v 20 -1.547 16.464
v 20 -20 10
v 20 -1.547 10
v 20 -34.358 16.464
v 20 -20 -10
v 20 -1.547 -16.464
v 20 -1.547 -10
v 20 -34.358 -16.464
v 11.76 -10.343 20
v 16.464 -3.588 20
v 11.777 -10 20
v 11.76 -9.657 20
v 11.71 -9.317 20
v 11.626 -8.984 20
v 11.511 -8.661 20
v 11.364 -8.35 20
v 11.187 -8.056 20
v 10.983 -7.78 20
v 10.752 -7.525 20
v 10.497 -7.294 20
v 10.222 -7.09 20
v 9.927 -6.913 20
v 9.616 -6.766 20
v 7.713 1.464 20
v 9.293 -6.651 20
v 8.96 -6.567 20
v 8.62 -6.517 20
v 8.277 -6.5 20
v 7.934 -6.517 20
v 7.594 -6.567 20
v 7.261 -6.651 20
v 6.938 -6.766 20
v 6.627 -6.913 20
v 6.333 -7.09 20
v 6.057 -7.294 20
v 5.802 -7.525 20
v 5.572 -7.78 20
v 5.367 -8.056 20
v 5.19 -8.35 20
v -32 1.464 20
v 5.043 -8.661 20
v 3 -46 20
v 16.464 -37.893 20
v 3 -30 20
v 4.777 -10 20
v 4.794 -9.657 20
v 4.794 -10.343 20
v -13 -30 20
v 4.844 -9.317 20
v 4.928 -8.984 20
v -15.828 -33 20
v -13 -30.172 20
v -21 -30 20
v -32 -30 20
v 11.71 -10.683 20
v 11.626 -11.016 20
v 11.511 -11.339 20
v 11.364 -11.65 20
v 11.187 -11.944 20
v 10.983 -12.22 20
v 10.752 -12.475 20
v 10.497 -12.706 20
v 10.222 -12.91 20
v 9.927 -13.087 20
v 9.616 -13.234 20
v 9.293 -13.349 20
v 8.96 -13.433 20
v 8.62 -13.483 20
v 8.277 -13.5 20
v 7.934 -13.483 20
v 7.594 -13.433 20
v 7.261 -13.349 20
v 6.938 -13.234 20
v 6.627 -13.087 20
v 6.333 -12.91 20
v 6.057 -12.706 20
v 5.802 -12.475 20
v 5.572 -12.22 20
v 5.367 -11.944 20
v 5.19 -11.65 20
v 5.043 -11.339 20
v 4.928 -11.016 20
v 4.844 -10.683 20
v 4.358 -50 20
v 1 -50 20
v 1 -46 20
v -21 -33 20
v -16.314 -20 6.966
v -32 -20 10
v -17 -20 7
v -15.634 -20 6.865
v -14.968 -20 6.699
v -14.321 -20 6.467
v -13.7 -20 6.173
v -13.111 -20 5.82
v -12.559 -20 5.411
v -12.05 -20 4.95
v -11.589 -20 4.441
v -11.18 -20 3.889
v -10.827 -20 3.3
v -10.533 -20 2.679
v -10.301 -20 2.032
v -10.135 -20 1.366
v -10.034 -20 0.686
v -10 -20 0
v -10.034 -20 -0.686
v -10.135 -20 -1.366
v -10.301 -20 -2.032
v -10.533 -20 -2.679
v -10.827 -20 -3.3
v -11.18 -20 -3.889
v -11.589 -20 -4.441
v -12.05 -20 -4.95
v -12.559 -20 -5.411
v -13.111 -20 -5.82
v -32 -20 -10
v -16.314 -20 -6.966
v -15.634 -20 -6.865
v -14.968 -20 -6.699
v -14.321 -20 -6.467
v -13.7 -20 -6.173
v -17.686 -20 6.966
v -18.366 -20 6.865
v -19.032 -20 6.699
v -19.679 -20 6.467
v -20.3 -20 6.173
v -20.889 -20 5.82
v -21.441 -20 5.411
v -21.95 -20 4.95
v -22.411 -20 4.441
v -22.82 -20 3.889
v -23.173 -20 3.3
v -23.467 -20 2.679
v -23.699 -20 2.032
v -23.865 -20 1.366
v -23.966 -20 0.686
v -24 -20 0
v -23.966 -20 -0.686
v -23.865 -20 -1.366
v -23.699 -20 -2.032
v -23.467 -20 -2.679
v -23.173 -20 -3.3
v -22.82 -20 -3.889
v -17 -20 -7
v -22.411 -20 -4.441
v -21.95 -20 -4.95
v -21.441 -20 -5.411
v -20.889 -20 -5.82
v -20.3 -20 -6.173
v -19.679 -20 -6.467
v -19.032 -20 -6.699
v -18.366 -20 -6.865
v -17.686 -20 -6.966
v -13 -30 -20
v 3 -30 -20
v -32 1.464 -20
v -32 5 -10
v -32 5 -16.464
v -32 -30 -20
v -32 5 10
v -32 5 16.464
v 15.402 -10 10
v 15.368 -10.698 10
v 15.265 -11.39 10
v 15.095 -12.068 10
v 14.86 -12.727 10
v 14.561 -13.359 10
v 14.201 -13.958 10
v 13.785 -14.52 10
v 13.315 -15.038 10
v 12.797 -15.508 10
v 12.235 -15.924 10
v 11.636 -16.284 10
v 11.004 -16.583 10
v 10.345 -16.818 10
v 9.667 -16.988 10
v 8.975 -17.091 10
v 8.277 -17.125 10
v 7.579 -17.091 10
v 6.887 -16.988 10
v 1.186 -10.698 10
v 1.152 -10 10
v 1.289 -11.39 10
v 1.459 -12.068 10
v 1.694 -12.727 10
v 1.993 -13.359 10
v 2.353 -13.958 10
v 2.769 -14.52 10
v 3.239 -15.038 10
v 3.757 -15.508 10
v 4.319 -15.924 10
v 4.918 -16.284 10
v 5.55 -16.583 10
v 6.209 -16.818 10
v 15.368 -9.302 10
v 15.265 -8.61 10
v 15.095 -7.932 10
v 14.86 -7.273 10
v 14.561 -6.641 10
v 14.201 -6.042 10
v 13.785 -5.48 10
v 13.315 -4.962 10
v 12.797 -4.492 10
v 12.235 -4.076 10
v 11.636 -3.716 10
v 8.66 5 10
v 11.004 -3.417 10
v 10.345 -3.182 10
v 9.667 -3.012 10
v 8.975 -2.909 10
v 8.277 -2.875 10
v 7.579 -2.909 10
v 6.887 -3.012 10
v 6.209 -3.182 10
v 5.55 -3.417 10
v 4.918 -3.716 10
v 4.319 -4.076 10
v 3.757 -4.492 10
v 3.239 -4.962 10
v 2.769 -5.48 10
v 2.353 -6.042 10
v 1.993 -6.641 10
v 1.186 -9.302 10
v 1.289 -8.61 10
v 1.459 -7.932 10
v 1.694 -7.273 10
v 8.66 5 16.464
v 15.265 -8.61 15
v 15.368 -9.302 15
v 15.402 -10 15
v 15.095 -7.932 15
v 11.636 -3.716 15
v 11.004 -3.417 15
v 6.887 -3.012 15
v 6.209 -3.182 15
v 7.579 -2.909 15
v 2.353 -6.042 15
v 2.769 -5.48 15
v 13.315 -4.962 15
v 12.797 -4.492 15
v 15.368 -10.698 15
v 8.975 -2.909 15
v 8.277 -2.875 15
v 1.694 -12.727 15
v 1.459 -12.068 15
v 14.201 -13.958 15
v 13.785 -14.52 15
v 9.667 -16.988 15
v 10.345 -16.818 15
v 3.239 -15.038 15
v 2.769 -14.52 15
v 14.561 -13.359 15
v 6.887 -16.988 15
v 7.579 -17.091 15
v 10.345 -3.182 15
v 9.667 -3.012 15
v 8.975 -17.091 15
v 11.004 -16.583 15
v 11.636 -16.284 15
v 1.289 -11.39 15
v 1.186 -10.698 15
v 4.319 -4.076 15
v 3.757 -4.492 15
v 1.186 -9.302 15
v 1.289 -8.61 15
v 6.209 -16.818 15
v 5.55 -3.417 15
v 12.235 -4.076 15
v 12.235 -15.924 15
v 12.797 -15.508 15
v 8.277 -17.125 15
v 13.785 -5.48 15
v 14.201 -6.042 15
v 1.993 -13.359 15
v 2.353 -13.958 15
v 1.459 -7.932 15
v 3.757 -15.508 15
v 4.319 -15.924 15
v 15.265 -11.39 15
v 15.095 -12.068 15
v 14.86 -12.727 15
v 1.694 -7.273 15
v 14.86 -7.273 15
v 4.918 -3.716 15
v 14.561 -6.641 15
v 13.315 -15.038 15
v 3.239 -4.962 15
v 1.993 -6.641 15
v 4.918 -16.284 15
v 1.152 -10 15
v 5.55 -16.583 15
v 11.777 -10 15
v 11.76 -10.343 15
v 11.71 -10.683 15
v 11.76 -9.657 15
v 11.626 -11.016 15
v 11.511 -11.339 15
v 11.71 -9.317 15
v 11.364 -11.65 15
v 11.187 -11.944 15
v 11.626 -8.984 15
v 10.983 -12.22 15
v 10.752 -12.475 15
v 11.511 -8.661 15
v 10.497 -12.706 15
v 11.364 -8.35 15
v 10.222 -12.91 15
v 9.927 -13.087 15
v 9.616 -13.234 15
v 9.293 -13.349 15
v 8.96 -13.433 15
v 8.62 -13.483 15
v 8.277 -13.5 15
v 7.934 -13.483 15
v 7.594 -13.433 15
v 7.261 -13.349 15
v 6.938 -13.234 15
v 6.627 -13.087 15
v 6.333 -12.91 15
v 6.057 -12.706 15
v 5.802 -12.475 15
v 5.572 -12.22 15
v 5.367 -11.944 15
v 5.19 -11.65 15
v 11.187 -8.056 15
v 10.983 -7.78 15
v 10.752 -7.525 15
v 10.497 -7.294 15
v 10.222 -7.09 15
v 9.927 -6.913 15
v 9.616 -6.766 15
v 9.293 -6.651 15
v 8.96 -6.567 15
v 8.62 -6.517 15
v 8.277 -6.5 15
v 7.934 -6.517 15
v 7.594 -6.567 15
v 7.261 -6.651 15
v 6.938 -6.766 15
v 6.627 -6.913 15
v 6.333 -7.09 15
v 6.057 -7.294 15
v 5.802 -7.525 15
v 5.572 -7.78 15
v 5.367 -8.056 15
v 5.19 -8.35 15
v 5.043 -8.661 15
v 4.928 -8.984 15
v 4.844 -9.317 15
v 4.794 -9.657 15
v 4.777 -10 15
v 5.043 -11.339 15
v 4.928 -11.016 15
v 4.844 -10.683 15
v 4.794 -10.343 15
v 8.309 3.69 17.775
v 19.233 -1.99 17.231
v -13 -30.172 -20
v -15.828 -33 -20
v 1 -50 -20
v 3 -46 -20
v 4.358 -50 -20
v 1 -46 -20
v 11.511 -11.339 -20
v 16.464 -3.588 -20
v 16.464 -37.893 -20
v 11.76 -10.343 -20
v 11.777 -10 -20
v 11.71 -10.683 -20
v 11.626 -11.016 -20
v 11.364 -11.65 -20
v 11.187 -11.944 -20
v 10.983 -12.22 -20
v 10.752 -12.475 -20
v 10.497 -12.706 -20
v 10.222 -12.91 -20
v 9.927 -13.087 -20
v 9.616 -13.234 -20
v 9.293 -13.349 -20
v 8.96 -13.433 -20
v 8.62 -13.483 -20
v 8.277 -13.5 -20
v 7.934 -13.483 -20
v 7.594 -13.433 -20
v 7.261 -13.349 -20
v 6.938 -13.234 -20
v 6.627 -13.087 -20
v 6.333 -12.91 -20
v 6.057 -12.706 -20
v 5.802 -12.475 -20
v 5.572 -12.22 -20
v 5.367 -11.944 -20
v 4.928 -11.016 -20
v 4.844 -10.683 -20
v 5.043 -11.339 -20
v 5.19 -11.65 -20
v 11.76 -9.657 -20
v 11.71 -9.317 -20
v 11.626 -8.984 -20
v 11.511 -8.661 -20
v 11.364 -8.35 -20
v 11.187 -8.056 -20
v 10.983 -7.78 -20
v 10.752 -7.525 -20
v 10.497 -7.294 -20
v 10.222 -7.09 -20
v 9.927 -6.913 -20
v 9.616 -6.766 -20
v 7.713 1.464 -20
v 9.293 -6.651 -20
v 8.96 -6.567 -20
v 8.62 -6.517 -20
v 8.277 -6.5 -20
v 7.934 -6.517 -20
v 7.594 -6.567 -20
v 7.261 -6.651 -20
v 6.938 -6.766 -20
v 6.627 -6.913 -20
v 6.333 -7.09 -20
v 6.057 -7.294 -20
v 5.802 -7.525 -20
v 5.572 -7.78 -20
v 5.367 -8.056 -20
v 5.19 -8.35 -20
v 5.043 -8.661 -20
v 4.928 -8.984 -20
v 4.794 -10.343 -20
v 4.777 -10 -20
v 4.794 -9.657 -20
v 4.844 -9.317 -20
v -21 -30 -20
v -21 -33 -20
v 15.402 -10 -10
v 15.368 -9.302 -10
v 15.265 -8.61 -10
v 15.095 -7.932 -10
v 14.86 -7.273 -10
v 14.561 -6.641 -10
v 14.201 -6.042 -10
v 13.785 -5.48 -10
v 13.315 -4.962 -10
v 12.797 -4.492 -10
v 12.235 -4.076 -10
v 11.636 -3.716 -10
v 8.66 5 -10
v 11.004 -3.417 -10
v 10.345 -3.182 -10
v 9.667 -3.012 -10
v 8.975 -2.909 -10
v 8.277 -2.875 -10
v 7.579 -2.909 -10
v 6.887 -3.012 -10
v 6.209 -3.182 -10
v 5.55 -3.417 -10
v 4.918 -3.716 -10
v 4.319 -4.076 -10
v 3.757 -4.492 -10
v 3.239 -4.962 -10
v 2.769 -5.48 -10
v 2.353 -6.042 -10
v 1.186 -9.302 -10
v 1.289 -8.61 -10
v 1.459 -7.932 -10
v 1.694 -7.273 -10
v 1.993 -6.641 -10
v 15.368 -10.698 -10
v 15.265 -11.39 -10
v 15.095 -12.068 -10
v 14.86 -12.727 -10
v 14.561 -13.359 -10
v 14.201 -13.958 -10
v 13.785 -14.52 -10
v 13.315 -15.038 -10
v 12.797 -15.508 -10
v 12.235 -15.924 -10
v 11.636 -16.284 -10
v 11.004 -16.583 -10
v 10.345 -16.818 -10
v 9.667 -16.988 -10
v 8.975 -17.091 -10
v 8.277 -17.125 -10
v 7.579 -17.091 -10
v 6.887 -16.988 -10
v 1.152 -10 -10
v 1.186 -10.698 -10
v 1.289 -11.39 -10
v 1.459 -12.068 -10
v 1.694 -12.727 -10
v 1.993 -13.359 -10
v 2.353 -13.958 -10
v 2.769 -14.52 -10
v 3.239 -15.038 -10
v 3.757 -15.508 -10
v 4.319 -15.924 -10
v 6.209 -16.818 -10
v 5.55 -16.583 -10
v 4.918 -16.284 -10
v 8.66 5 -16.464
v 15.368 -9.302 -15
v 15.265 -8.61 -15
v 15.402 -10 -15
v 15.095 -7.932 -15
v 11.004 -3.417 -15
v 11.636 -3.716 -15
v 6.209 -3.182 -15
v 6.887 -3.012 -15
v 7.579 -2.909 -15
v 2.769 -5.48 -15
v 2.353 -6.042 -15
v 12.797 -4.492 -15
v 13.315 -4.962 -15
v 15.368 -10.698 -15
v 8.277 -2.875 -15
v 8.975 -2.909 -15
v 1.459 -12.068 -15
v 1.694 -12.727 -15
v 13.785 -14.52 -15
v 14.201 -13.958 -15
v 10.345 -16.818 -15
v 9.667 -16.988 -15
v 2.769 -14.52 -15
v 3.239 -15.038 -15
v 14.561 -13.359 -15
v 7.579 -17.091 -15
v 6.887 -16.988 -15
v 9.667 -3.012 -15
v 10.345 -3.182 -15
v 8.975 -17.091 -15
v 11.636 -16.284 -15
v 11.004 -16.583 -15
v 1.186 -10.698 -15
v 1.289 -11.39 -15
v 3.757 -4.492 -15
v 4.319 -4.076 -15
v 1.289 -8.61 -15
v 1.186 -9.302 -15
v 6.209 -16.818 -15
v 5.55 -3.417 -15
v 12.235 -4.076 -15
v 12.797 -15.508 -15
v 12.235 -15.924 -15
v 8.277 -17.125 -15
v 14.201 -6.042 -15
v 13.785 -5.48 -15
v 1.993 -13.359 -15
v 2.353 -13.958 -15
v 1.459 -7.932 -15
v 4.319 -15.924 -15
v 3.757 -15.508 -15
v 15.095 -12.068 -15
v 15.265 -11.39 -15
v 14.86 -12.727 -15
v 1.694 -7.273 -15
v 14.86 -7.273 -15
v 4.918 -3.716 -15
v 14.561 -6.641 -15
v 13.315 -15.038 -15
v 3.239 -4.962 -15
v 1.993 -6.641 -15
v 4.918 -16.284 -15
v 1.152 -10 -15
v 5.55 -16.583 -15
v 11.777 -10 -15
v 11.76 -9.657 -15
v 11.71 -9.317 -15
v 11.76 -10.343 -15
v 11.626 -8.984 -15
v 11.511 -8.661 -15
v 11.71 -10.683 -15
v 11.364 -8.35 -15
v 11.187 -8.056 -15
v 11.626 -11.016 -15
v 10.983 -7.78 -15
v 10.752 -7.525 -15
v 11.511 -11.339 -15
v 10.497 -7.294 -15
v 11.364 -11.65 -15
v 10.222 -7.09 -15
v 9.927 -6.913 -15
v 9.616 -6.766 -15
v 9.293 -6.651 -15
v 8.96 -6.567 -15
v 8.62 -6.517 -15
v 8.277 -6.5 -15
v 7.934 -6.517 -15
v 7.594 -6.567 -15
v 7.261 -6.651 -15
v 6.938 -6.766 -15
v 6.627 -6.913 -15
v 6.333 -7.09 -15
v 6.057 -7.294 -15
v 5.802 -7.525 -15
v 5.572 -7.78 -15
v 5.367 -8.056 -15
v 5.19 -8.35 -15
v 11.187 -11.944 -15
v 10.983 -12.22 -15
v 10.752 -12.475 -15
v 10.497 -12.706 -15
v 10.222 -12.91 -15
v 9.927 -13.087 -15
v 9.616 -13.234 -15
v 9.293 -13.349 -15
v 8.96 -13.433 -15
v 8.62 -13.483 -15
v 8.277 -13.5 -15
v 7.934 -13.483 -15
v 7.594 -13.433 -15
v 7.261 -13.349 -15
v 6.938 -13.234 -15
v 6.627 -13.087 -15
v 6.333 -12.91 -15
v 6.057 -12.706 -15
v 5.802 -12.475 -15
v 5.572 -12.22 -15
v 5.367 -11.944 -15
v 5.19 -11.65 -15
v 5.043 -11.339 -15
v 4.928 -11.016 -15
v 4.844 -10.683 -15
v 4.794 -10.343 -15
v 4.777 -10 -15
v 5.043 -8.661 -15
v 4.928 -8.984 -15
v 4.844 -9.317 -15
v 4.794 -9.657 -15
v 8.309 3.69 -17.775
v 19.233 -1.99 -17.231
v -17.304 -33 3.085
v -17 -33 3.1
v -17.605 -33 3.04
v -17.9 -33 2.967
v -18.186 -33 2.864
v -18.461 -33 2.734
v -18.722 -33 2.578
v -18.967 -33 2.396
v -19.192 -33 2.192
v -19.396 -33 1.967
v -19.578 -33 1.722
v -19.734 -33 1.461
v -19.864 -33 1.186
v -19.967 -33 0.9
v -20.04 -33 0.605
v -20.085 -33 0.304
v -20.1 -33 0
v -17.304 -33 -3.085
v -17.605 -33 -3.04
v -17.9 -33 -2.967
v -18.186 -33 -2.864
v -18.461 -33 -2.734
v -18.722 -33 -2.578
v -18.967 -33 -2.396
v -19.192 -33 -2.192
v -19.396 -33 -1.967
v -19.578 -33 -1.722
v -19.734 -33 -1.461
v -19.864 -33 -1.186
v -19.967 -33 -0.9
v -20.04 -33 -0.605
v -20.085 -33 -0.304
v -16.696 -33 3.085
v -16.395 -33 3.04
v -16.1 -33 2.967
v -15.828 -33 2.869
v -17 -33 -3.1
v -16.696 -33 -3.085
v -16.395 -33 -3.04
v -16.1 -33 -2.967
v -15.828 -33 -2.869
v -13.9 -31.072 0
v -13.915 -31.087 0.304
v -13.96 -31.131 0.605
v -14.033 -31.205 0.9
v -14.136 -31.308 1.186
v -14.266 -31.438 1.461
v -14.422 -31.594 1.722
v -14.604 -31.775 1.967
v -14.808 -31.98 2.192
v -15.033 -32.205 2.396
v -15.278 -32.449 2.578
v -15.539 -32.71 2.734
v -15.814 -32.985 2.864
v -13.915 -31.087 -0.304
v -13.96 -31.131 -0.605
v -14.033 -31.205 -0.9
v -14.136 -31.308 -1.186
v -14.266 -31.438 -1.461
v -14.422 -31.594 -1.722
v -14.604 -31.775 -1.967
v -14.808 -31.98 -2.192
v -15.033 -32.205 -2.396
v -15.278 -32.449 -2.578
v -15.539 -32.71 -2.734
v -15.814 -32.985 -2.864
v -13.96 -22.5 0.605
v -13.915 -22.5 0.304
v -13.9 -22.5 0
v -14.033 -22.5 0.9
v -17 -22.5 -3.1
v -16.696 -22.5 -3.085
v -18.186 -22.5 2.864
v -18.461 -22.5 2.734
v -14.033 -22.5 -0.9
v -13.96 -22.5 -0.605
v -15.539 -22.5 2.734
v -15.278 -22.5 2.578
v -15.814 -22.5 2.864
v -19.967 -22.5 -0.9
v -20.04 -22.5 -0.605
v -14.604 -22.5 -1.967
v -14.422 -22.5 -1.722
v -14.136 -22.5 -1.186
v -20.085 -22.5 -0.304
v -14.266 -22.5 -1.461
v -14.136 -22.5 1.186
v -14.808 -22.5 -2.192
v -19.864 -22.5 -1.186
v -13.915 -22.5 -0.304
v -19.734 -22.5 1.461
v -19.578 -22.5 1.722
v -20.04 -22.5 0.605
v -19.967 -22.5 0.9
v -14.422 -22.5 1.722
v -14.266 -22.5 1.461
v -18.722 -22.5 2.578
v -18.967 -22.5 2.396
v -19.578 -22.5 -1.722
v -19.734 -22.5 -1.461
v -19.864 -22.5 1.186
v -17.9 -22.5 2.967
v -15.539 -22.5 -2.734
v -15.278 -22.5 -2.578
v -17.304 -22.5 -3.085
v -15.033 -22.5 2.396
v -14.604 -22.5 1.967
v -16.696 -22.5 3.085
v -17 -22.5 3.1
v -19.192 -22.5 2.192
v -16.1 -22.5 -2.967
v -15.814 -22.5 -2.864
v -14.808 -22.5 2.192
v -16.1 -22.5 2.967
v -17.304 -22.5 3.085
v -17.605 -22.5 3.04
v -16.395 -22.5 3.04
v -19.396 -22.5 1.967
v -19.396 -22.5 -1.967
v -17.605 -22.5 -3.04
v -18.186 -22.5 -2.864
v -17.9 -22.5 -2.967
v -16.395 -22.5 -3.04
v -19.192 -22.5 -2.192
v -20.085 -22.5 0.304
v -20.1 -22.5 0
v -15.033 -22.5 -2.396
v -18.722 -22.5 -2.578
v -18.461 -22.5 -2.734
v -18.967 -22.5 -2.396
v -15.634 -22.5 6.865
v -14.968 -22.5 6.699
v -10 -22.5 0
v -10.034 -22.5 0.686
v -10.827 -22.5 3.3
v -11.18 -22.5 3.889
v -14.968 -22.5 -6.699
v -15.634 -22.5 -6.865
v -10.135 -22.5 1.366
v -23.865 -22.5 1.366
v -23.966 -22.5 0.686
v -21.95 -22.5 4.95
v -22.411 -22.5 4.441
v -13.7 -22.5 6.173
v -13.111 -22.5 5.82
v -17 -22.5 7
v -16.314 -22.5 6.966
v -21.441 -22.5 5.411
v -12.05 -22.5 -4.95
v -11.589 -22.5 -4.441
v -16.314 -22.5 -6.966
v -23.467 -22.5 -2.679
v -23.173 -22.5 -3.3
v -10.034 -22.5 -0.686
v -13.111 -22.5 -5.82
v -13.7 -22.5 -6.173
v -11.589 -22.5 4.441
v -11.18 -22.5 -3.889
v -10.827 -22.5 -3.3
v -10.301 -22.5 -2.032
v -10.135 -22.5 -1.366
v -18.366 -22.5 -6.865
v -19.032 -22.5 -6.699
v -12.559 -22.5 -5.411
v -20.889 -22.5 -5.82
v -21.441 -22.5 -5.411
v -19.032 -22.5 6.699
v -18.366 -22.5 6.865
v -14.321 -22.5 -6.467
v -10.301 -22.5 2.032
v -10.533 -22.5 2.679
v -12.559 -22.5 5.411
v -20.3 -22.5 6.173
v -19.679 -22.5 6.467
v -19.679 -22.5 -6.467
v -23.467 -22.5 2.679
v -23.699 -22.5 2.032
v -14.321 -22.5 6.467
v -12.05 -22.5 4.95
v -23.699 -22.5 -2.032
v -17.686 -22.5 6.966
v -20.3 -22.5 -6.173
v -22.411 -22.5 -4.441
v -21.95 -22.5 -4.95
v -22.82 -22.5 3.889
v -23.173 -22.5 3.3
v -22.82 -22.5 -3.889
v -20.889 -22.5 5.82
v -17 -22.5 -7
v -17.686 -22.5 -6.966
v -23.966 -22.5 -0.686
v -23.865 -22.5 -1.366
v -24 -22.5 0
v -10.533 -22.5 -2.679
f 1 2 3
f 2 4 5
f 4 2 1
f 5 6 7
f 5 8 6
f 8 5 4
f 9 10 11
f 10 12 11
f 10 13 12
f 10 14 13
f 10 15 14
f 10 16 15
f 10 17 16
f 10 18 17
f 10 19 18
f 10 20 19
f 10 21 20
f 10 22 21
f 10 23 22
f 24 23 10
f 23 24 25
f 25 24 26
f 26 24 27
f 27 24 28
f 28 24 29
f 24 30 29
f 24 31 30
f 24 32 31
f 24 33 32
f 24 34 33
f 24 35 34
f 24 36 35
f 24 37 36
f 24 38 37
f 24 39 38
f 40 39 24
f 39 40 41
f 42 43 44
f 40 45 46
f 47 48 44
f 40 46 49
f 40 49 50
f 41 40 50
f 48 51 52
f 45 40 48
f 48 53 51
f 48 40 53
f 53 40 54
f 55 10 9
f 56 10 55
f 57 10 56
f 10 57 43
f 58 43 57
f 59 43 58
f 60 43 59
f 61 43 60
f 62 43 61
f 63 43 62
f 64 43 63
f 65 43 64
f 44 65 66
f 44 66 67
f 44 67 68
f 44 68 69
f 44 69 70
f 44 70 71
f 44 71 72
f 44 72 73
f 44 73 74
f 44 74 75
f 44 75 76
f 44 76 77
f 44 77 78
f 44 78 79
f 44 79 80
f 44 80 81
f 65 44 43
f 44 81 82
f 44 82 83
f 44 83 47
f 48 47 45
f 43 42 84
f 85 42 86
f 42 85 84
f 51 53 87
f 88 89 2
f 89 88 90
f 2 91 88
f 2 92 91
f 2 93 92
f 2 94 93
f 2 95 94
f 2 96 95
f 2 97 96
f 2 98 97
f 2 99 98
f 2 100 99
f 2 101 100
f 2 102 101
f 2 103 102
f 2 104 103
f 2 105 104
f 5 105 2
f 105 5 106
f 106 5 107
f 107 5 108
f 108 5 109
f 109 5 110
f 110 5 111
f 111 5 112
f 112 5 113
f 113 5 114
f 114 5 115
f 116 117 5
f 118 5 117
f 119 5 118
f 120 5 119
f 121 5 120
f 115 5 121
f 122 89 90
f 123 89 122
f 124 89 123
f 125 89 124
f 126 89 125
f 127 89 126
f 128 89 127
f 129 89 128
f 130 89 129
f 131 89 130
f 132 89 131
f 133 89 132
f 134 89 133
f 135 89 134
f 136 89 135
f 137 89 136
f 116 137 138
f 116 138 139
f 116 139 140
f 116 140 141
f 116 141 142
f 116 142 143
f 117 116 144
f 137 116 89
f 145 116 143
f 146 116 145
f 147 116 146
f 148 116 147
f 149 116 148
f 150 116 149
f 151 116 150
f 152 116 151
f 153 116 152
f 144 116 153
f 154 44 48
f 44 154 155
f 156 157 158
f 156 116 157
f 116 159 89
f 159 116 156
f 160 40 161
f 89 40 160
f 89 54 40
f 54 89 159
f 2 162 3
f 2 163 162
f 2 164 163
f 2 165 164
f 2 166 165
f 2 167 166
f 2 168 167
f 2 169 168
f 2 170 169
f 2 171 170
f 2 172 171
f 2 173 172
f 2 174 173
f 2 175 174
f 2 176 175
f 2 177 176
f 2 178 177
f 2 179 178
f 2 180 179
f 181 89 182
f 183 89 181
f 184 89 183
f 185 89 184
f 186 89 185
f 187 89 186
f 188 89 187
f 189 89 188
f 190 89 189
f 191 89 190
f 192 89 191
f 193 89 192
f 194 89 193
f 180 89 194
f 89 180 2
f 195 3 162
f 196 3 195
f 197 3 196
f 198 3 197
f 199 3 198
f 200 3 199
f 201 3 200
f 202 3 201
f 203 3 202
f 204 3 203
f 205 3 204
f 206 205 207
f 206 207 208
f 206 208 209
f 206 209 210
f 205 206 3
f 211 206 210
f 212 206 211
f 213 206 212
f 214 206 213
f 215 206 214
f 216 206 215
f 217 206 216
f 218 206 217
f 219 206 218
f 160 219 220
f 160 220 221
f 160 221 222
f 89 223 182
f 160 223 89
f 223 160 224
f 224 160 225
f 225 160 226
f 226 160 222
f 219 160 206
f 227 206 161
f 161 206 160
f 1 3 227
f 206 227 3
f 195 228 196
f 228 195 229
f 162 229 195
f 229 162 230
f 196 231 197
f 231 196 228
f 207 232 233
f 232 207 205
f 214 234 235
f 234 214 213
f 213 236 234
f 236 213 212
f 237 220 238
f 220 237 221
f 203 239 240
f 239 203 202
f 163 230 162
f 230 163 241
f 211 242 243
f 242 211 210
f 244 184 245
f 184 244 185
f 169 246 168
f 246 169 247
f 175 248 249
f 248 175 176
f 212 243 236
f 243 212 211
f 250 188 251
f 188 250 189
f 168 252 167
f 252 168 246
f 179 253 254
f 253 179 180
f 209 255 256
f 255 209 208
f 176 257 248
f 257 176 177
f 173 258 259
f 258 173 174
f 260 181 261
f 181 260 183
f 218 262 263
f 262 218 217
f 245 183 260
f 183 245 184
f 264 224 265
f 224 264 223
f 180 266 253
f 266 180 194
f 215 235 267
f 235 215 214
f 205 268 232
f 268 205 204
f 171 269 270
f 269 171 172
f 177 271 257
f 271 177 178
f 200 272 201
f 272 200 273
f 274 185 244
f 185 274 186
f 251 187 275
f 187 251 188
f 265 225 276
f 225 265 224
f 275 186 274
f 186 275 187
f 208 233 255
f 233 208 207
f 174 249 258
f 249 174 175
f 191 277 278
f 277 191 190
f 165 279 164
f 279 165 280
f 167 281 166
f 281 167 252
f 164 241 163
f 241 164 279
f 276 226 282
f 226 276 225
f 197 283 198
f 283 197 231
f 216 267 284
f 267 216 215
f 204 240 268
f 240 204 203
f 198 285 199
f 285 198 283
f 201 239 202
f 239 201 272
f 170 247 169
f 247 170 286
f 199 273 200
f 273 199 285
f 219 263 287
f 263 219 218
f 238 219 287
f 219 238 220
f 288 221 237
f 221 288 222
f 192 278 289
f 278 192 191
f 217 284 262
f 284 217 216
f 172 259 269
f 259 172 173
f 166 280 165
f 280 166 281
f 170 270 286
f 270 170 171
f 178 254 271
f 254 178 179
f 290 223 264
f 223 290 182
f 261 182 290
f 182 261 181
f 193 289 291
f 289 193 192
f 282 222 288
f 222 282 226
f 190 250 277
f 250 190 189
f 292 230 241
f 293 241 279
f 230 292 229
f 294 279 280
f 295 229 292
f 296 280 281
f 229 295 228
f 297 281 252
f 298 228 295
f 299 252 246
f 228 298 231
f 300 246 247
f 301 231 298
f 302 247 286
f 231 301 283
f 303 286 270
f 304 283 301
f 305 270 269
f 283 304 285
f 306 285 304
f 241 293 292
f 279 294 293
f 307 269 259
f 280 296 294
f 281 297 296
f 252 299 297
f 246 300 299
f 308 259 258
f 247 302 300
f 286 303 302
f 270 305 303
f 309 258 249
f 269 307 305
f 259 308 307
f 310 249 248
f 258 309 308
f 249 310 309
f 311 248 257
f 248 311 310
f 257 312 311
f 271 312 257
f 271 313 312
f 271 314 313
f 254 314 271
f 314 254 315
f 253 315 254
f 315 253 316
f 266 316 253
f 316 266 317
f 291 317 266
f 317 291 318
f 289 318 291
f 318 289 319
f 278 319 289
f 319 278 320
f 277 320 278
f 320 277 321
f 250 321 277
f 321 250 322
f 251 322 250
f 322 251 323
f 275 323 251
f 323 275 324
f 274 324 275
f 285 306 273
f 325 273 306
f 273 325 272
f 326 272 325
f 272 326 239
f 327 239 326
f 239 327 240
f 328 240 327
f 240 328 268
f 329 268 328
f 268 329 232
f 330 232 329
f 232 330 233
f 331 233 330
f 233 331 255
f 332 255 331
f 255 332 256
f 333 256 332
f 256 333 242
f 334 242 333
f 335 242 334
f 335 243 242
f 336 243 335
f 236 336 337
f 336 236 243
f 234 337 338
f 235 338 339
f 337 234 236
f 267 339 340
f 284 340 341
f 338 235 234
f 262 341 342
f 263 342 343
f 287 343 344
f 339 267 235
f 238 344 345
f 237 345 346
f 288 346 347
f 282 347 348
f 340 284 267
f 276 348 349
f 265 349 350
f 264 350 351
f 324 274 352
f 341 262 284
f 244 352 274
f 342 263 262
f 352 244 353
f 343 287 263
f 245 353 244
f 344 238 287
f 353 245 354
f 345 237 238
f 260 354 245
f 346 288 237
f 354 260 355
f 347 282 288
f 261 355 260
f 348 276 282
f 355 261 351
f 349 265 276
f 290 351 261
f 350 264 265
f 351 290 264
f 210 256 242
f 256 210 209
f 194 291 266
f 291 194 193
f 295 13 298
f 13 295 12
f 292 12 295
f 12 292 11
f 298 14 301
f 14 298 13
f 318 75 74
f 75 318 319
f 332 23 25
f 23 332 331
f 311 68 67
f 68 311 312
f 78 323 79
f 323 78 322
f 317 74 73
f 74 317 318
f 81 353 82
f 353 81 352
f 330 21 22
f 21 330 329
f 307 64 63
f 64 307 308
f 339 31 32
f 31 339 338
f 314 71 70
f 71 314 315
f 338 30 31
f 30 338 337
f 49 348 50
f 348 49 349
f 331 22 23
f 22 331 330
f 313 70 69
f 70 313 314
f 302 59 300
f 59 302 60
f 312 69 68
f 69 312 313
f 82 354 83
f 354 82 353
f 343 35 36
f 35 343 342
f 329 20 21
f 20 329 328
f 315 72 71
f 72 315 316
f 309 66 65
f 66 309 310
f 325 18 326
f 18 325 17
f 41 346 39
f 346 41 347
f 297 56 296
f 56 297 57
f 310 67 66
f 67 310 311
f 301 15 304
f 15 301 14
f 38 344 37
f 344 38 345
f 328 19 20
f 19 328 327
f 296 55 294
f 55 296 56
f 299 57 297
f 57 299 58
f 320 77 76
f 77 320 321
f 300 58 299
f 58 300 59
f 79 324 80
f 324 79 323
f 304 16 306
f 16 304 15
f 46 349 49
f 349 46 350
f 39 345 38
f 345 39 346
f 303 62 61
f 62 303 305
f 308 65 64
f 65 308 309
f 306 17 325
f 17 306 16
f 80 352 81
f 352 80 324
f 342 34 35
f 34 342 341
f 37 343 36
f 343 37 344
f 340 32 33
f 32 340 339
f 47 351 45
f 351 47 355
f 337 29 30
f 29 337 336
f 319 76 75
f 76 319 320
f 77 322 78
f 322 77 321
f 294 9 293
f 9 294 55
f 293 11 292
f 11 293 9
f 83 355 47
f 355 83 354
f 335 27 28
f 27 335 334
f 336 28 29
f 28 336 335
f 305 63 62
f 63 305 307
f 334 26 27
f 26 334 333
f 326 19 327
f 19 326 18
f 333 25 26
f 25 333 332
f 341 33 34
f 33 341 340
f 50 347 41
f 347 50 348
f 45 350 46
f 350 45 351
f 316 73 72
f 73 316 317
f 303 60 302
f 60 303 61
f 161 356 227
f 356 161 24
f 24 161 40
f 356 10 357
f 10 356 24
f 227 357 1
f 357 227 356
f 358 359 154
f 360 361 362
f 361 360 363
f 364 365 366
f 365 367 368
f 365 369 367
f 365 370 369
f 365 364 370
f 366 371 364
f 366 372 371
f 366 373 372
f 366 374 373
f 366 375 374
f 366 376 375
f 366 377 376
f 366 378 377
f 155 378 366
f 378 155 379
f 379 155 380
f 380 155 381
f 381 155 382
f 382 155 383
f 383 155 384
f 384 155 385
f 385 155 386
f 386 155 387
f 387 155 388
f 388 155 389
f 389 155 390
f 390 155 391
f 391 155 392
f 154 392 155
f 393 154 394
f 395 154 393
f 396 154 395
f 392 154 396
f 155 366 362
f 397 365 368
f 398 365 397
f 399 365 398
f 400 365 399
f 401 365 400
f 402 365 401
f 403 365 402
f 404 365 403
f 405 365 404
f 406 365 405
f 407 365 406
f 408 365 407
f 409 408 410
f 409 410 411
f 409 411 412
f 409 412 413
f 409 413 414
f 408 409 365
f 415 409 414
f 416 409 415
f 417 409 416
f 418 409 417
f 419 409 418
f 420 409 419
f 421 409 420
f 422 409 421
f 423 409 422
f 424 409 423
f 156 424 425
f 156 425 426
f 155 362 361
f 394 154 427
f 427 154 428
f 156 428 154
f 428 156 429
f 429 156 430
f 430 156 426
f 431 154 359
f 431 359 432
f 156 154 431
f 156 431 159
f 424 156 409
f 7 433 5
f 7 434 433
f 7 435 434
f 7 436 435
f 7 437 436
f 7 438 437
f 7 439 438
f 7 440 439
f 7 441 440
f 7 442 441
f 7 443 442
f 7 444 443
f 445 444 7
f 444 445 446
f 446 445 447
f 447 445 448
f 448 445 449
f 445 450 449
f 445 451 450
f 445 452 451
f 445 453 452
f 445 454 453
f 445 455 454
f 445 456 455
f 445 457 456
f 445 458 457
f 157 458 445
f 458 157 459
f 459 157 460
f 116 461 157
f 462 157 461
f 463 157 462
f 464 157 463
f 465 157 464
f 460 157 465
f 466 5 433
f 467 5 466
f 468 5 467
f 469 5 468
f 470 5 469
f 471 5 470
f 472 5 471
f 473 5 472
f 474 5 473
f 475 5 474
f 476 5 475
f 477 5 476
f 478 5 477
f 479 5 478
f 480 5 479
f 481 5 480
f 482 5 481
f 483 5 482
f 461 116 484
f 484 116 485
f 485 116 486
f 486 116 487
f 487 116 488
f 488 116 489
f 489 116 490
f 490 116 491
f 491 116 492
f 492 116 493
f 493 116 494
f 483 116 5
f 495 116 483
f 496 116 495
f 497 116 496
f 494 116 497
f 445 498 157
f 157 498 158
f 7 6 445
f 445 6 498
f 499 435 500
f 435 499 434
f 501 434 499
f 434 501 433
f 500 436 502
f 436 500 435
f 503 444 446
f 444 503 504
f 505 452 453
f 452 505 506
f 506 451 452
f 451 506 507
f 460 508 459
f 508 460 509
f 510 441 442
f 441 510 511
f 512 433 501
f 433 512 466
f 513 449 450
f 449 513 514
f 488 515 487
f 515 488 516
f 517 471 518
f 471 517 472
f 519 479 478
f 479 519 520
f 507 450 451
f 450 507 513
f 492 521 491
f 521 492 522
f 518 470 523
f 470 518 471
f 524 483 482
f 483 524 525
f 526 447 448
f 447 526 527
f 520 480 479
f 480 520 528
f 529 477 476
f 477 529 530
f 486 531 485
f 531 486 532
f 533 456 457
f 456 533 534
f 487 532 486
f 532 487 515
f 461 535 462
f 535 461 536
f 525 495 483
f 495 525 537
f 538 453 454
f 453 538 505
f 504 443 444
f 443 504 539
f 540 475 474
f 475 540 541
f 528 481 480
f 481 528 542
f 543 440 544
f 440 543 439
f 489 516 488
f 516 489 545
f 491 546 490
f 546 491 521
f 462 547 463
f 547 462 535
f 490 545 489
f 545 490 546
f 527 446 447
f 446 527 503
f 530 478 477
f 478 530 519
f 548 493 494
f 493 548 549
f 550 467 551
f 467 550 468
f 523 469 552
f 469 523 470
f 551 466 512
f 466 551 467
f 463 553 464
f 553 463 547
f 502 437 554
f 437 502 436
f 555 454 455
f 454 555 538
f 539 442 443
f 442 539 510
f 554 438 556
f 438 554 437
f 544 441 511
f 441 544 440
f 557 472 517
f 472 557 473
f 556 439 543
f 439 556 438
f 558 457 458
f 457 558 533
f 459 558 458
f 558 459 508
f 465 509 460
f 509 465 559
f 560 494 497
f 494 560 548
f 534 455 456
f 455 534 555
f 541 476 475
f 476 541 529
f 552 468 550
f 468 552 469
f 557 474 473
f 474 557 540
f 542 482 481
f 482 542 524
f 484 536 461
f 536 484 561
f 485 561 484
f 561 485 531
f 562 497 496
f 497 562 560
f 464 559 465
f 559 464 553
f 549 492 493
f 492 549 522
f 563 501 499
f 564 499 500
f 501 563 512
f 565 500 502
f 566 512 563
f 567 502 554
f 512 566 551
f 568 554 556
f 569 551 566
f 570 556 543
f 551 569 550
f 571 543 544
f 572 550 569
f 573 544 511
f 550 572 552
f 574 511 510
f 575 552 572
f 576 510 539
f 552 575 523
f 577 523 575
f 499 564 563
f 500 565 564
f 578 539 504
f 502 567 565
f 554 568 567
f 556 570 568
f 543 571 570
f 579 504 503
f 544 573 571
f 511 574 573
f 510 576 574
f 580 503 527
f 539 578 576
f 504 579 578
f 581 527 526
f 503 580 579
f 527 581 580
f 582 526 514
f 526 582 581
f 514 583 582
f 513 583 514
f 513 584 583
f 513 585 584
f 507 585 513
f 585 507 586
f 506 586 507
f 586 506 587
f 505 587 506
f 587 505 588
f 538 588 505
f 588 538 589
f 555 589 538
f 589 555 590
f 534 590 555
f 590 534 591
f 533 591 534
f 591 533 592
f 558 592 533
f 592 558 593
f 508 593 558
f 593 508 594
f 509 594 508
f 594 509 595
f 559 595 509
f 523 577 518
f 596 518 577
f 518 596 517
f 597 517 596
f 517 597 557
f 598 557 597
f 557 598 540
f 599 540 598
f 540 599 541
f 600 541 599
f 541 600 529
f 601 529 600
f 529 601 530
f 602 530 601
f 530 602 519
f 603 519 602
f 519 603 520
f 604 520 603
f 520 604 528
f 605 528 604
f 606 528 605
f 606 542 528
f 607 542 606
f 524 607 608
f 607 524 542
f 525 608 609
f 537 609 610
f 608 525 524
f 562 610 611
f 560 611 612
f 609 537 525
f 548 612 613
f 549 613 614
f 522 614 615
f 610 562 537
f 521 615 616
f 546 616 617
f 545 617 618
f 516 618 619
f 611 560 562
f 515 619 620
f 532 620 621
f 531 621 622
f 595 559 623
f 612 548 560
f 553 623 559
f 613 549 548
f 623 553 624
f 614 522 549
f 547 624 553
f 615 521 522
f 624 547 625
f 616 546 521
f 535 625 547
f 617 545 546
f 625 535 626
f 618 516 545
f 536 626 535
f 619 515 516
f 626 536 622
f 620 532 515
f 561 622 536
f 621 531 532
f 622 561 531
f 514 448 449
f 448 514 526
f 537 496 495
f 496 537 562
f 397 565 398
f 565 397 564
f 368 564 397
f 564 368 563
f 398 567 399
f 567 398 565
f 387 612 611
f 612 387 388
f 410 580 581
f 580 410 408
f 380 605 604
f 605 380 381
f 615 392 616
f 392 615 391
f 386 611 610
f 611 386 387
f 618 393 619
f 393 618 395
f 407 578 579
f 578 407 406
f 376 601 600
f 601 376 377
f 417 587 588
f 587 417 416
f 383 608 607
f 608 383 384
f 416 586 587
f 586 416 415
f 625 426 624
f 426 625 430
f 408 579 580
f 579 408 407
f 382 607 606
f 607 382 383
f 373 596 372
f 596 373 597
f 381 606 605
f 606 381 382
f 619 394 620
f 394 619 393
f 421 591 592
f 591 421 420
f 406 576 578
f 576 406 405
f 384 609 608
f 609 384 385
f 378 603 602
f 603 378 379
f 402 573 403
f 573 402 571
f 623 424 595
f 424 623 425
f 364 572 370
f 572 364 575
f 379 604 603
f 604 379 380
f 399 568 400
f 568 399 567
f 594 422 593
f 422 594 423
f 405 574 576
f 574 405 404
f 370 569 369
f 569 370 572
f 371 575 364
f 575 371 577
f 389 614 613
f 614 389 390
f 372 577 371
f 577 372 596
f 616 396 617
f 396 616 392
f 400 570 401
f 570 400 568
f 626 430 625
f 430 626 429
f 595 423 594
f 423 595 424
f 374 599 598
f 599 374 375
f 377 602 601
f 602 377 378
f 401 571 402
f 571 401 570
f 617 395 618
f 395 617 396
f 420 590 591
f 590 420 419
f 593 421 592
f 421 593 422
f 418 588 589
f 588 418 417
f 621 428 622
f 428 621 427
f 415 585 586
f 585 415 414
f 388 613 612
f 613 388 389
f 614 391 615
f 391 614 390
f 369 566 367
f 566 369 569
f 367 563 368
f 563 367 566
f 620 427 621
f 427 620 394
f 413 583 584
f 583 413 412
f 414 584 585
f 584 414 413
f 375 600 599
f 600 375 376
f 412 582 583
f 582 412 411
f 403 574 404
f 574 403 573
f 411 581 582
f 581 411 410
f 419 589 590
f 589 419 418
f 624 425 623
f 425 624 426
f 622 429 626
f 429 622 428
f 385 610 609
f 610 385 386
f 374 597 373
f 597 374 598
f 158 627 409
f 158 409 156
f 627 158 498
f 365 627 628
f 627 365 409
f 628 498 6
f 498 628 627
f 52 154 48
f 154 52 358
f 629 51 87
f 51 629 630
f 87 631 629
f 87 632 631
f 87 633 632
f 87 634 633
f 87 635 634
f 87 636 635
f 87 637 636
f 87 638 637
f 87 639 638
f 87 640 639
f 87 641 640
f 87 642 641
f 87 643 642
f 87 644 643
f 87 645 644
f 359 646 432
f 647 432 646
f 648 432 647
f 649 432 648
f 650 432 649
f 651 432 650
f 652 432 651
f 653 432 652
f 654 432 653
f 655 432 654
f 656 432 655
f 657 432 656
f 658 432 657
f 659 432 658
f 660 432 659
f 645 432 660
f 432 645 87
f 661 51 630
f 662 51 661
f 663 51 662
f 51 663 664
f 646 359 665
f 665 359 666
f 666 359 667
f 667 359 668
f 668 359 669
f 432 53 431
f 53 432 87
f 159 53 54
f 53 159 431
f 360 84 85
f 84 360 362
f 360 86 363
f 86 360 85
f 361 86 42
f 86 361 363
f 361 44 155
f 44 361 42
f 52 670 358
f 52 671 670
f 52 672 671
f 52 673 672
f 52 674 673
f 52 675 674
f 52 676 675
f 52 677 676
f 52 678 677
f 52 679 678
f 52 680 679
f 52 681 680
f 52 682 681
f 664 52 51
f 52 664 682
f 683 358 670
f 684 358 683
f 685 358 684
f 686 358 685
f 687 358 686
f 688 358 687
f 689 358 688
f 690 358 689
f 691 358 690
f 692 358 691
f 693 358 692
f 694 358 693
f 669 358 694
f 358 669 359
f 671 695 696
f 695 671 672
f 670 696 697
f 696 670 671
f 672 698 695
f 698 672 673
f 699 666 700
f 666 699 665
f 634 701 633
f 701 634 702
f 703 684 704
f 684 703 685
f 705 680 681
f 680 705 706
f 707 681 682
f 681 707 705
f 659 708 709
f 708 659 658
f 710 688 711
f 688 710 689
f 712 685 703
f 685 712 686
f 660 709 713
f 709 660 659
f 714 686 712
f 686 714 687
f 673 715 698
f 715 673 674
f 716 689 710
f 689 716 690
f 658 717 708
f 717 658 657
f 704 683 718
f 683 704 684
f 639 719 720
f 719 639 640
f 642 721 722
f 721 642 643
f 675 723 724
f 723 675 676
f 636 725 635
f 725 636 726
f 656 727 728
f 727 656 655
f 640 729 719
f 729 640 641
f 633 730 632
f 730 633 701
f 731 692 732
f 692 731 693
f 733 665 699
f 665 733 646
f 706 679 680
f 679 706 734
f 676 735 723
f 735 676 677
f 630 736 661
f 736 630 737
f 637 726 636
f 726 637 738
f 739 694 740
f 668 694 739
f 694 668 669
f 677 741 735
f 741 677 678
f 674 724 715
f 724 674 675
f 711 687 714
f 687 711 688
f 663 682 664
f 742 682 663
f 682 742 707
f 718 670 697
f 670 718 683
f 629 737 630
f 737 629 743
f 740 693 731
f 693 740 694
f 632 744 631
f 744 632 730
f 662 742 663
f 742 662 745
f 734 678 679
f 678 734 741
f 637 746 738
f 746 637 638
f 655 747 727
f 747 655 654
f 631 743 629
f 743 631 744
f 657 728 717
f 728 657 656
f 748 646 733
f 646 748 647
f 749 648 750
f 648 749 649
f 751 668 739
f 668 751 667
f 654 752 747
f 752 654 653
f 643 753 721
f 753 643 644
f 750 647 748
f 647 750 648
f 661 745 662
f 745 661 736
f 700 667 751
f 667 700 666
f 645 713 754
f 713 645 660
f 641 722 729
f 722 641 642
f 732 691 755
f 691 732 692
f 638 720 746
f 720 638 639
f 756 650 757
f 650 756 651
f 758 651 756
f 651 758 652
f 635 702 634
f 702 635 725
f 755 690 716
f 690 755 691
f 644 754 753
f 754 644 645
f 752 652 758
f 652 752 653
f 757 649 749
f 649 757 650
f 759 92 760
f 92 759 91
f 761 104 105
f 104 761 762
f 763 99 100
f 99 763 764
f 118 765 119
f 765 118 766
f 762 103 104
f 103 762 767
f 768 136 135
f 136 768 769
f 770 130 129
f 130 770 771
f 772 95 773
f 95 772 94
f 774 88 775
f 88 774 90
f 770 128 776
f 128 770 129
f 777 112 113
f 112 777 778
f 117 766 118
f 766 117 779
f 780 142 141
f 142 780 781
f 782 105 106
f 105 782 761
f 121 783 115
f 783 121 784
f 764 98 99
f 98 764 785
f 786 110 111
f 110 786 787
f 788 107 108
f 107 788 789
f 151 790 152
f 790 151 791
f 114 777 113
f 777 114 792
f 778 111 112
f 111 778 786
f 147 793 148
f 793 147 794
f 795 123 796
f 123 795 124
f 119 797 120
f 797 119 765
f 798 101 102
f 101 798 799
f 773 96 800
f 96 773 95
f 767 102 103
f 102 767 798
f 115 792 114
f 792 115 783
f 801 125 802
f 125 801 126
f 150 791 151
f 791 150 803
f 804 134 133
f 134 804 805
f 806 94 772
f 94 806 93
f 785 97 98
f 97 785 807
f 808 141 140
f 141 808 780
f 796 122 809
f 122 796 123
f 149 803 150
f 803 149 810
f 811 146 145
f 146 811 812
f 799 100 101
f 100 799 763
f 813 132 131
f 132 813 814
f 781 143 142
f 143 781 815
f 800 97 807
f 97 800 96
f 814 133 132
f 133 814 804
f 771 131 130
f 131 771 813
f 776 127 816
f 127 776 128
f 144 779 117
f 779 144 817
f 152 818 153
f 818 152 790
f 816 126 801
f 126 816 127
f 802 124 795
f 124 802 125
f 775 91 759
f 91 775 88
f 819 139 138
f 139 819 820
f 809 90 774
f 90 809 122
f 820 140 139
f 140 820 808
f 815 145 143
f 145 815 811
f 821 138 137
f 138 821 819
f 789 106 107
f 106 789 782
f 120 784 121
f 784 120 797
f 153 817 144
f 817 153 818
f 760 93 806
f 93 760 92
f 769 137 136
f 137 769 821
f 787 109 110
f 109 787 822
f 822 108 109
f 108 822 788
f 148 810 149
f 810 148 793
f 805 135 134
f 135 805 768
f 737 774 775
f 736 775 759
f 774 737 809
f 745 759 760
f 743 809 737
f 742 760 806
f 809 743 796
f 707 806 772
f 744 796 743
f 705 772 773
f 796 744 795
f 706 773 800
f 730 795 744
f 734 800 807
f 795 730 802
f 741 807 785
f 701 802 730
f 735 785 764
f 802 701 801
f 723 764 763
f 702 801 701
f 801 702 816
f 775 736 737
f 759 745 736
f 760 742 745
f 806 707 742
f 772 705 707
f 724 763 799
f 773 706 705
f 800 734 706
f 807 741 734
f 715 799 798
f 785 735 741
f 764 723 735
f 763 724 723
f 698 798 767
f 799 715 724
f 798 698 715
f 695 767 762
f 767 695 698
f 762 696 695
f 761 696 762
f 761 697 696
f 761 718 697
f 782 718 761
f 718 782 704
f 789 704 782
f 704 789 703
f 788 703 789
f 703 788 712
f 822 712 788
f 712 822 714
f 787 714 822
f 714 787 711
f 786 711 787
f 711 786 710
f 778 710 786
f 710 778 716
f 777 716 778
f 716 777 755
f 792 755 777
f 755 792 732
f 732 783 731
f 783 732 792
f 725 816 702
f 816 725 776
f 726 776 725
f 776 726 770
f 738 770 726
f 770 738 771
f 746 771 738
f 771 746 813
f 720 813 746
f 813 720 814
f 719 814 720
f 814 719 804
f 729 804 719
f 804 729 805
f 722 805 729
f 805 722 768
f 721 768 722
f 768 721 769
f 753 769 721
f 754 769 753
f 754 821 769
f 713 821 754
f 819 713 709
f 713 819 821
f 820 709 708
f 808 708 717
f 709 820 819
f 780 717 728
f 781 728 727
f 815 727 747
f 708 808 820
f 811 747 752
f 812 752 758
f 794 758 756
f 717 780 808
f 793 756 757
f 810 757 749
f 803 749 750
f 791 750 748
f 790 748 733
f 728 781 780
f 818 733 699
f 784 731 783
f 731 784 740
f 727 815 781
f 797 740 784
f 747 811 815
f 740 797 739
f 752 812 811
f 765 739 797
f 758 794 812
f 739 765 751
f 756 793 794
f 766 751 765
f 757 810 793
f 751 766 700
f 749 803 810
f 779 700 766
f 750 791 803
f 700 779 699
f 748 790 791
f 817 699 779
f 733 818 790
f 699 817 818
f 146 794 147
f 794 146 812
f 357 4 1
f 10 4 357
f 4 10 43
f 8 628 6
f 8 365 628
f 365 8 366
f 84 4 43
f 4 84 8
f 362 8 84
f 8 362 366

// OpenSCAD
// file: 4040_mount_bracket.scad
// profile
pr_side=40;
pr_slot = 8;
pr_wall = 4.5;
// mount bracket
mb_tick = 10;
arm_l = pr_side/2;


module mount_4040(width){
    linear_extrude(height = width, center = true, convexity = 10, twist = 0)
    union() {
        square([pr_side + mb_tick -5, mb_tick]);
       
        // Arm to slot
        translate([0, -arm_l, 0])
            square([mb_tick, arm_l]); 
        
        // Slot insert
        translate([mb_tick , -arm_l, 0])
            square([2, pr_slot/2]);
        
        // slot guide
        translate([pr_side/2 + mb_tick - pr_slot/2 , -3, 0])
            square([pr_slot, 3]);
    }
}

mount_4040(40);
// main file
use <4040_mount_bracket.scad>

$fn = 64;

// plate
p_tck = 10;
p_width = 40;
profile_side=40;

holder_4040_offset = 7;
// x profile edge 
x_pe=p_width/2-holder_4040_offset-p_tck;

// GT2  belt
// Distance from profile edge to y carriage = 28
// Distance from y carriage  to belt= 17
// Distance from profile edge = 28 - 17 = 11
gt2_edge_offset=11;
gt2_teeth = 16;
// This is belt thickness minus the teeths
gt2_belt_h = 0.63;

gt2_pulley_d = gt2_teeth*2/PI;

// center to outer edge
gt2_ctoe = gt2_pulley_d/2 + gt2_belt_h;



// bearing
b_od = 14;
b_id = 5;
b_tck = 5;
b_y_off = -10;
// p_width/2 makes it on profile edge
//b_x_off = (11 - gt2_ctoe ) ;
b_x_off=x_pe-gt2_ctoe+gt2_edge_offset;

// shaft
shaft_length = 20;

module pulley_half() {
    difference(){
        union() {
            // Back plate
            translate([-p_width/2,-(p_width/2 + p_tck),0])
                cube([p_width, p_tck, shaft_length/2 + p_tck]);
            linear_extrude(height = 10, center = false, convexity = 10, twist = 0)
            difference() {
                    difference(){
                        square([p_width+24,p_width], center=true);
                        translate([p_width,0,0])
                        square(p_width, center=true);
                    }
                   
                translate([p_width,10,0])
                    rotate(60)
                    square([p_width, p_width*4],center=true);
                translate([0,p_width-15,0])
                    square([p_width*4, p_width], center=true);
            }
        }
        
        // Bearing socket
        translate([b_x_off, b_y_off ,p_tck - b_tck])
            cylinder(h = p_tck, d = b_od + 0.25, center=false );
        
        // Central shaft hole
        translate([b_x_off, b_y_off ,-p_tck/2])
           cylinder(h = p_tck*2, d = b_id+2, center=false );
        
        // Champhers 
        //  Outside
        //      top chamfer
        translate([p_width/2, 0, 0])
        rotate([0,45,0])
            cube([5, p_width*2, 5], center = true);
        
        //      front chamfer
        translate([0,p_width/2-15,0])
        rotate([45,-0,0])
            cube([p_width*4,5,5], center = true);
        
        //      slope chamfer
        translate([0,10,0])
        rotate([45, 0, -30])
            cube([p_width*2, 5, 5], center = true);
        
        //      bottom chamfer
        //translate([-p_width/2, 0, 0])
        //rotate([0,45,0])
       //     cube([5,p_width*2,5], center = true);
    }
}
translate([0,0,0])
difference(){

    union(){
    translate([(p_width-holder_4040_offset)/2  ,-p_width,0])
        //difference(){
            cube([holder_4040_offset ,p_width/2,shaft_length+2*p_tck], center=true);
        //}
    mirror([1,0,0])
        translate([0,0, shaft_length/2 + p_tck])
        mirror([1,0,0])
        mirror([0,0,1])
            pulley_half();
        translate([0, 0, -(shaft_length/2 + p_tck)])
            pulley_half();
    rotate([0,180,0])
        //!translate([-p_width/2+holder_4040_offset,-p_width+p_tck,0])
        translate([-(p_tck+3),-p_width+p_tck,0])
        difference(){
            mount_4040(shaft_length+p_tck*2);
           // Trim 45 grad from guide so it can be printed
            translate([26,-3,0])
            rotate([0,0,45])
                cube([4,4,shaft_length+p_tck*4], center=true);
        }
    }
                // M6 trough hole
            rotate([90,0,0])
            translate([-profile_side/2+3,0])
                #cylinder(h=80, d=6.2, center=true);
            // Screw head cut
            rotate([90,0,0])
            translate([-profile_side/2+3,0,p_width/2])
                #cylinder(h=5, d=14, center=true);
    // Extend chamfers
        // Right edge
        translate([p_width/2, -20, shaft_length/2+p_tck])
        rotate([0,45,0])
            cube([5, p_width*2, 5], center = true);
       // Left edge
        translate([p_width/2, -20, -shaft_length/2-p_tck])
        rotate([0,45,0])
            cube([5, p_width*2, 5], center = true);
       //    
 //       translate([p_width/2, -50, 0])
 //       rotate([0,0,45])
//            cube([5, 5, p_width*2], center = true);
    
        // diagonal cut
        translate([(p_width-holder_4040_offset)/2  ,-p_width-12,0])
            rotate([0,0,45])
            cube([80 ,p_width/2,shaft_length+4*p_tck], center=true);
}
